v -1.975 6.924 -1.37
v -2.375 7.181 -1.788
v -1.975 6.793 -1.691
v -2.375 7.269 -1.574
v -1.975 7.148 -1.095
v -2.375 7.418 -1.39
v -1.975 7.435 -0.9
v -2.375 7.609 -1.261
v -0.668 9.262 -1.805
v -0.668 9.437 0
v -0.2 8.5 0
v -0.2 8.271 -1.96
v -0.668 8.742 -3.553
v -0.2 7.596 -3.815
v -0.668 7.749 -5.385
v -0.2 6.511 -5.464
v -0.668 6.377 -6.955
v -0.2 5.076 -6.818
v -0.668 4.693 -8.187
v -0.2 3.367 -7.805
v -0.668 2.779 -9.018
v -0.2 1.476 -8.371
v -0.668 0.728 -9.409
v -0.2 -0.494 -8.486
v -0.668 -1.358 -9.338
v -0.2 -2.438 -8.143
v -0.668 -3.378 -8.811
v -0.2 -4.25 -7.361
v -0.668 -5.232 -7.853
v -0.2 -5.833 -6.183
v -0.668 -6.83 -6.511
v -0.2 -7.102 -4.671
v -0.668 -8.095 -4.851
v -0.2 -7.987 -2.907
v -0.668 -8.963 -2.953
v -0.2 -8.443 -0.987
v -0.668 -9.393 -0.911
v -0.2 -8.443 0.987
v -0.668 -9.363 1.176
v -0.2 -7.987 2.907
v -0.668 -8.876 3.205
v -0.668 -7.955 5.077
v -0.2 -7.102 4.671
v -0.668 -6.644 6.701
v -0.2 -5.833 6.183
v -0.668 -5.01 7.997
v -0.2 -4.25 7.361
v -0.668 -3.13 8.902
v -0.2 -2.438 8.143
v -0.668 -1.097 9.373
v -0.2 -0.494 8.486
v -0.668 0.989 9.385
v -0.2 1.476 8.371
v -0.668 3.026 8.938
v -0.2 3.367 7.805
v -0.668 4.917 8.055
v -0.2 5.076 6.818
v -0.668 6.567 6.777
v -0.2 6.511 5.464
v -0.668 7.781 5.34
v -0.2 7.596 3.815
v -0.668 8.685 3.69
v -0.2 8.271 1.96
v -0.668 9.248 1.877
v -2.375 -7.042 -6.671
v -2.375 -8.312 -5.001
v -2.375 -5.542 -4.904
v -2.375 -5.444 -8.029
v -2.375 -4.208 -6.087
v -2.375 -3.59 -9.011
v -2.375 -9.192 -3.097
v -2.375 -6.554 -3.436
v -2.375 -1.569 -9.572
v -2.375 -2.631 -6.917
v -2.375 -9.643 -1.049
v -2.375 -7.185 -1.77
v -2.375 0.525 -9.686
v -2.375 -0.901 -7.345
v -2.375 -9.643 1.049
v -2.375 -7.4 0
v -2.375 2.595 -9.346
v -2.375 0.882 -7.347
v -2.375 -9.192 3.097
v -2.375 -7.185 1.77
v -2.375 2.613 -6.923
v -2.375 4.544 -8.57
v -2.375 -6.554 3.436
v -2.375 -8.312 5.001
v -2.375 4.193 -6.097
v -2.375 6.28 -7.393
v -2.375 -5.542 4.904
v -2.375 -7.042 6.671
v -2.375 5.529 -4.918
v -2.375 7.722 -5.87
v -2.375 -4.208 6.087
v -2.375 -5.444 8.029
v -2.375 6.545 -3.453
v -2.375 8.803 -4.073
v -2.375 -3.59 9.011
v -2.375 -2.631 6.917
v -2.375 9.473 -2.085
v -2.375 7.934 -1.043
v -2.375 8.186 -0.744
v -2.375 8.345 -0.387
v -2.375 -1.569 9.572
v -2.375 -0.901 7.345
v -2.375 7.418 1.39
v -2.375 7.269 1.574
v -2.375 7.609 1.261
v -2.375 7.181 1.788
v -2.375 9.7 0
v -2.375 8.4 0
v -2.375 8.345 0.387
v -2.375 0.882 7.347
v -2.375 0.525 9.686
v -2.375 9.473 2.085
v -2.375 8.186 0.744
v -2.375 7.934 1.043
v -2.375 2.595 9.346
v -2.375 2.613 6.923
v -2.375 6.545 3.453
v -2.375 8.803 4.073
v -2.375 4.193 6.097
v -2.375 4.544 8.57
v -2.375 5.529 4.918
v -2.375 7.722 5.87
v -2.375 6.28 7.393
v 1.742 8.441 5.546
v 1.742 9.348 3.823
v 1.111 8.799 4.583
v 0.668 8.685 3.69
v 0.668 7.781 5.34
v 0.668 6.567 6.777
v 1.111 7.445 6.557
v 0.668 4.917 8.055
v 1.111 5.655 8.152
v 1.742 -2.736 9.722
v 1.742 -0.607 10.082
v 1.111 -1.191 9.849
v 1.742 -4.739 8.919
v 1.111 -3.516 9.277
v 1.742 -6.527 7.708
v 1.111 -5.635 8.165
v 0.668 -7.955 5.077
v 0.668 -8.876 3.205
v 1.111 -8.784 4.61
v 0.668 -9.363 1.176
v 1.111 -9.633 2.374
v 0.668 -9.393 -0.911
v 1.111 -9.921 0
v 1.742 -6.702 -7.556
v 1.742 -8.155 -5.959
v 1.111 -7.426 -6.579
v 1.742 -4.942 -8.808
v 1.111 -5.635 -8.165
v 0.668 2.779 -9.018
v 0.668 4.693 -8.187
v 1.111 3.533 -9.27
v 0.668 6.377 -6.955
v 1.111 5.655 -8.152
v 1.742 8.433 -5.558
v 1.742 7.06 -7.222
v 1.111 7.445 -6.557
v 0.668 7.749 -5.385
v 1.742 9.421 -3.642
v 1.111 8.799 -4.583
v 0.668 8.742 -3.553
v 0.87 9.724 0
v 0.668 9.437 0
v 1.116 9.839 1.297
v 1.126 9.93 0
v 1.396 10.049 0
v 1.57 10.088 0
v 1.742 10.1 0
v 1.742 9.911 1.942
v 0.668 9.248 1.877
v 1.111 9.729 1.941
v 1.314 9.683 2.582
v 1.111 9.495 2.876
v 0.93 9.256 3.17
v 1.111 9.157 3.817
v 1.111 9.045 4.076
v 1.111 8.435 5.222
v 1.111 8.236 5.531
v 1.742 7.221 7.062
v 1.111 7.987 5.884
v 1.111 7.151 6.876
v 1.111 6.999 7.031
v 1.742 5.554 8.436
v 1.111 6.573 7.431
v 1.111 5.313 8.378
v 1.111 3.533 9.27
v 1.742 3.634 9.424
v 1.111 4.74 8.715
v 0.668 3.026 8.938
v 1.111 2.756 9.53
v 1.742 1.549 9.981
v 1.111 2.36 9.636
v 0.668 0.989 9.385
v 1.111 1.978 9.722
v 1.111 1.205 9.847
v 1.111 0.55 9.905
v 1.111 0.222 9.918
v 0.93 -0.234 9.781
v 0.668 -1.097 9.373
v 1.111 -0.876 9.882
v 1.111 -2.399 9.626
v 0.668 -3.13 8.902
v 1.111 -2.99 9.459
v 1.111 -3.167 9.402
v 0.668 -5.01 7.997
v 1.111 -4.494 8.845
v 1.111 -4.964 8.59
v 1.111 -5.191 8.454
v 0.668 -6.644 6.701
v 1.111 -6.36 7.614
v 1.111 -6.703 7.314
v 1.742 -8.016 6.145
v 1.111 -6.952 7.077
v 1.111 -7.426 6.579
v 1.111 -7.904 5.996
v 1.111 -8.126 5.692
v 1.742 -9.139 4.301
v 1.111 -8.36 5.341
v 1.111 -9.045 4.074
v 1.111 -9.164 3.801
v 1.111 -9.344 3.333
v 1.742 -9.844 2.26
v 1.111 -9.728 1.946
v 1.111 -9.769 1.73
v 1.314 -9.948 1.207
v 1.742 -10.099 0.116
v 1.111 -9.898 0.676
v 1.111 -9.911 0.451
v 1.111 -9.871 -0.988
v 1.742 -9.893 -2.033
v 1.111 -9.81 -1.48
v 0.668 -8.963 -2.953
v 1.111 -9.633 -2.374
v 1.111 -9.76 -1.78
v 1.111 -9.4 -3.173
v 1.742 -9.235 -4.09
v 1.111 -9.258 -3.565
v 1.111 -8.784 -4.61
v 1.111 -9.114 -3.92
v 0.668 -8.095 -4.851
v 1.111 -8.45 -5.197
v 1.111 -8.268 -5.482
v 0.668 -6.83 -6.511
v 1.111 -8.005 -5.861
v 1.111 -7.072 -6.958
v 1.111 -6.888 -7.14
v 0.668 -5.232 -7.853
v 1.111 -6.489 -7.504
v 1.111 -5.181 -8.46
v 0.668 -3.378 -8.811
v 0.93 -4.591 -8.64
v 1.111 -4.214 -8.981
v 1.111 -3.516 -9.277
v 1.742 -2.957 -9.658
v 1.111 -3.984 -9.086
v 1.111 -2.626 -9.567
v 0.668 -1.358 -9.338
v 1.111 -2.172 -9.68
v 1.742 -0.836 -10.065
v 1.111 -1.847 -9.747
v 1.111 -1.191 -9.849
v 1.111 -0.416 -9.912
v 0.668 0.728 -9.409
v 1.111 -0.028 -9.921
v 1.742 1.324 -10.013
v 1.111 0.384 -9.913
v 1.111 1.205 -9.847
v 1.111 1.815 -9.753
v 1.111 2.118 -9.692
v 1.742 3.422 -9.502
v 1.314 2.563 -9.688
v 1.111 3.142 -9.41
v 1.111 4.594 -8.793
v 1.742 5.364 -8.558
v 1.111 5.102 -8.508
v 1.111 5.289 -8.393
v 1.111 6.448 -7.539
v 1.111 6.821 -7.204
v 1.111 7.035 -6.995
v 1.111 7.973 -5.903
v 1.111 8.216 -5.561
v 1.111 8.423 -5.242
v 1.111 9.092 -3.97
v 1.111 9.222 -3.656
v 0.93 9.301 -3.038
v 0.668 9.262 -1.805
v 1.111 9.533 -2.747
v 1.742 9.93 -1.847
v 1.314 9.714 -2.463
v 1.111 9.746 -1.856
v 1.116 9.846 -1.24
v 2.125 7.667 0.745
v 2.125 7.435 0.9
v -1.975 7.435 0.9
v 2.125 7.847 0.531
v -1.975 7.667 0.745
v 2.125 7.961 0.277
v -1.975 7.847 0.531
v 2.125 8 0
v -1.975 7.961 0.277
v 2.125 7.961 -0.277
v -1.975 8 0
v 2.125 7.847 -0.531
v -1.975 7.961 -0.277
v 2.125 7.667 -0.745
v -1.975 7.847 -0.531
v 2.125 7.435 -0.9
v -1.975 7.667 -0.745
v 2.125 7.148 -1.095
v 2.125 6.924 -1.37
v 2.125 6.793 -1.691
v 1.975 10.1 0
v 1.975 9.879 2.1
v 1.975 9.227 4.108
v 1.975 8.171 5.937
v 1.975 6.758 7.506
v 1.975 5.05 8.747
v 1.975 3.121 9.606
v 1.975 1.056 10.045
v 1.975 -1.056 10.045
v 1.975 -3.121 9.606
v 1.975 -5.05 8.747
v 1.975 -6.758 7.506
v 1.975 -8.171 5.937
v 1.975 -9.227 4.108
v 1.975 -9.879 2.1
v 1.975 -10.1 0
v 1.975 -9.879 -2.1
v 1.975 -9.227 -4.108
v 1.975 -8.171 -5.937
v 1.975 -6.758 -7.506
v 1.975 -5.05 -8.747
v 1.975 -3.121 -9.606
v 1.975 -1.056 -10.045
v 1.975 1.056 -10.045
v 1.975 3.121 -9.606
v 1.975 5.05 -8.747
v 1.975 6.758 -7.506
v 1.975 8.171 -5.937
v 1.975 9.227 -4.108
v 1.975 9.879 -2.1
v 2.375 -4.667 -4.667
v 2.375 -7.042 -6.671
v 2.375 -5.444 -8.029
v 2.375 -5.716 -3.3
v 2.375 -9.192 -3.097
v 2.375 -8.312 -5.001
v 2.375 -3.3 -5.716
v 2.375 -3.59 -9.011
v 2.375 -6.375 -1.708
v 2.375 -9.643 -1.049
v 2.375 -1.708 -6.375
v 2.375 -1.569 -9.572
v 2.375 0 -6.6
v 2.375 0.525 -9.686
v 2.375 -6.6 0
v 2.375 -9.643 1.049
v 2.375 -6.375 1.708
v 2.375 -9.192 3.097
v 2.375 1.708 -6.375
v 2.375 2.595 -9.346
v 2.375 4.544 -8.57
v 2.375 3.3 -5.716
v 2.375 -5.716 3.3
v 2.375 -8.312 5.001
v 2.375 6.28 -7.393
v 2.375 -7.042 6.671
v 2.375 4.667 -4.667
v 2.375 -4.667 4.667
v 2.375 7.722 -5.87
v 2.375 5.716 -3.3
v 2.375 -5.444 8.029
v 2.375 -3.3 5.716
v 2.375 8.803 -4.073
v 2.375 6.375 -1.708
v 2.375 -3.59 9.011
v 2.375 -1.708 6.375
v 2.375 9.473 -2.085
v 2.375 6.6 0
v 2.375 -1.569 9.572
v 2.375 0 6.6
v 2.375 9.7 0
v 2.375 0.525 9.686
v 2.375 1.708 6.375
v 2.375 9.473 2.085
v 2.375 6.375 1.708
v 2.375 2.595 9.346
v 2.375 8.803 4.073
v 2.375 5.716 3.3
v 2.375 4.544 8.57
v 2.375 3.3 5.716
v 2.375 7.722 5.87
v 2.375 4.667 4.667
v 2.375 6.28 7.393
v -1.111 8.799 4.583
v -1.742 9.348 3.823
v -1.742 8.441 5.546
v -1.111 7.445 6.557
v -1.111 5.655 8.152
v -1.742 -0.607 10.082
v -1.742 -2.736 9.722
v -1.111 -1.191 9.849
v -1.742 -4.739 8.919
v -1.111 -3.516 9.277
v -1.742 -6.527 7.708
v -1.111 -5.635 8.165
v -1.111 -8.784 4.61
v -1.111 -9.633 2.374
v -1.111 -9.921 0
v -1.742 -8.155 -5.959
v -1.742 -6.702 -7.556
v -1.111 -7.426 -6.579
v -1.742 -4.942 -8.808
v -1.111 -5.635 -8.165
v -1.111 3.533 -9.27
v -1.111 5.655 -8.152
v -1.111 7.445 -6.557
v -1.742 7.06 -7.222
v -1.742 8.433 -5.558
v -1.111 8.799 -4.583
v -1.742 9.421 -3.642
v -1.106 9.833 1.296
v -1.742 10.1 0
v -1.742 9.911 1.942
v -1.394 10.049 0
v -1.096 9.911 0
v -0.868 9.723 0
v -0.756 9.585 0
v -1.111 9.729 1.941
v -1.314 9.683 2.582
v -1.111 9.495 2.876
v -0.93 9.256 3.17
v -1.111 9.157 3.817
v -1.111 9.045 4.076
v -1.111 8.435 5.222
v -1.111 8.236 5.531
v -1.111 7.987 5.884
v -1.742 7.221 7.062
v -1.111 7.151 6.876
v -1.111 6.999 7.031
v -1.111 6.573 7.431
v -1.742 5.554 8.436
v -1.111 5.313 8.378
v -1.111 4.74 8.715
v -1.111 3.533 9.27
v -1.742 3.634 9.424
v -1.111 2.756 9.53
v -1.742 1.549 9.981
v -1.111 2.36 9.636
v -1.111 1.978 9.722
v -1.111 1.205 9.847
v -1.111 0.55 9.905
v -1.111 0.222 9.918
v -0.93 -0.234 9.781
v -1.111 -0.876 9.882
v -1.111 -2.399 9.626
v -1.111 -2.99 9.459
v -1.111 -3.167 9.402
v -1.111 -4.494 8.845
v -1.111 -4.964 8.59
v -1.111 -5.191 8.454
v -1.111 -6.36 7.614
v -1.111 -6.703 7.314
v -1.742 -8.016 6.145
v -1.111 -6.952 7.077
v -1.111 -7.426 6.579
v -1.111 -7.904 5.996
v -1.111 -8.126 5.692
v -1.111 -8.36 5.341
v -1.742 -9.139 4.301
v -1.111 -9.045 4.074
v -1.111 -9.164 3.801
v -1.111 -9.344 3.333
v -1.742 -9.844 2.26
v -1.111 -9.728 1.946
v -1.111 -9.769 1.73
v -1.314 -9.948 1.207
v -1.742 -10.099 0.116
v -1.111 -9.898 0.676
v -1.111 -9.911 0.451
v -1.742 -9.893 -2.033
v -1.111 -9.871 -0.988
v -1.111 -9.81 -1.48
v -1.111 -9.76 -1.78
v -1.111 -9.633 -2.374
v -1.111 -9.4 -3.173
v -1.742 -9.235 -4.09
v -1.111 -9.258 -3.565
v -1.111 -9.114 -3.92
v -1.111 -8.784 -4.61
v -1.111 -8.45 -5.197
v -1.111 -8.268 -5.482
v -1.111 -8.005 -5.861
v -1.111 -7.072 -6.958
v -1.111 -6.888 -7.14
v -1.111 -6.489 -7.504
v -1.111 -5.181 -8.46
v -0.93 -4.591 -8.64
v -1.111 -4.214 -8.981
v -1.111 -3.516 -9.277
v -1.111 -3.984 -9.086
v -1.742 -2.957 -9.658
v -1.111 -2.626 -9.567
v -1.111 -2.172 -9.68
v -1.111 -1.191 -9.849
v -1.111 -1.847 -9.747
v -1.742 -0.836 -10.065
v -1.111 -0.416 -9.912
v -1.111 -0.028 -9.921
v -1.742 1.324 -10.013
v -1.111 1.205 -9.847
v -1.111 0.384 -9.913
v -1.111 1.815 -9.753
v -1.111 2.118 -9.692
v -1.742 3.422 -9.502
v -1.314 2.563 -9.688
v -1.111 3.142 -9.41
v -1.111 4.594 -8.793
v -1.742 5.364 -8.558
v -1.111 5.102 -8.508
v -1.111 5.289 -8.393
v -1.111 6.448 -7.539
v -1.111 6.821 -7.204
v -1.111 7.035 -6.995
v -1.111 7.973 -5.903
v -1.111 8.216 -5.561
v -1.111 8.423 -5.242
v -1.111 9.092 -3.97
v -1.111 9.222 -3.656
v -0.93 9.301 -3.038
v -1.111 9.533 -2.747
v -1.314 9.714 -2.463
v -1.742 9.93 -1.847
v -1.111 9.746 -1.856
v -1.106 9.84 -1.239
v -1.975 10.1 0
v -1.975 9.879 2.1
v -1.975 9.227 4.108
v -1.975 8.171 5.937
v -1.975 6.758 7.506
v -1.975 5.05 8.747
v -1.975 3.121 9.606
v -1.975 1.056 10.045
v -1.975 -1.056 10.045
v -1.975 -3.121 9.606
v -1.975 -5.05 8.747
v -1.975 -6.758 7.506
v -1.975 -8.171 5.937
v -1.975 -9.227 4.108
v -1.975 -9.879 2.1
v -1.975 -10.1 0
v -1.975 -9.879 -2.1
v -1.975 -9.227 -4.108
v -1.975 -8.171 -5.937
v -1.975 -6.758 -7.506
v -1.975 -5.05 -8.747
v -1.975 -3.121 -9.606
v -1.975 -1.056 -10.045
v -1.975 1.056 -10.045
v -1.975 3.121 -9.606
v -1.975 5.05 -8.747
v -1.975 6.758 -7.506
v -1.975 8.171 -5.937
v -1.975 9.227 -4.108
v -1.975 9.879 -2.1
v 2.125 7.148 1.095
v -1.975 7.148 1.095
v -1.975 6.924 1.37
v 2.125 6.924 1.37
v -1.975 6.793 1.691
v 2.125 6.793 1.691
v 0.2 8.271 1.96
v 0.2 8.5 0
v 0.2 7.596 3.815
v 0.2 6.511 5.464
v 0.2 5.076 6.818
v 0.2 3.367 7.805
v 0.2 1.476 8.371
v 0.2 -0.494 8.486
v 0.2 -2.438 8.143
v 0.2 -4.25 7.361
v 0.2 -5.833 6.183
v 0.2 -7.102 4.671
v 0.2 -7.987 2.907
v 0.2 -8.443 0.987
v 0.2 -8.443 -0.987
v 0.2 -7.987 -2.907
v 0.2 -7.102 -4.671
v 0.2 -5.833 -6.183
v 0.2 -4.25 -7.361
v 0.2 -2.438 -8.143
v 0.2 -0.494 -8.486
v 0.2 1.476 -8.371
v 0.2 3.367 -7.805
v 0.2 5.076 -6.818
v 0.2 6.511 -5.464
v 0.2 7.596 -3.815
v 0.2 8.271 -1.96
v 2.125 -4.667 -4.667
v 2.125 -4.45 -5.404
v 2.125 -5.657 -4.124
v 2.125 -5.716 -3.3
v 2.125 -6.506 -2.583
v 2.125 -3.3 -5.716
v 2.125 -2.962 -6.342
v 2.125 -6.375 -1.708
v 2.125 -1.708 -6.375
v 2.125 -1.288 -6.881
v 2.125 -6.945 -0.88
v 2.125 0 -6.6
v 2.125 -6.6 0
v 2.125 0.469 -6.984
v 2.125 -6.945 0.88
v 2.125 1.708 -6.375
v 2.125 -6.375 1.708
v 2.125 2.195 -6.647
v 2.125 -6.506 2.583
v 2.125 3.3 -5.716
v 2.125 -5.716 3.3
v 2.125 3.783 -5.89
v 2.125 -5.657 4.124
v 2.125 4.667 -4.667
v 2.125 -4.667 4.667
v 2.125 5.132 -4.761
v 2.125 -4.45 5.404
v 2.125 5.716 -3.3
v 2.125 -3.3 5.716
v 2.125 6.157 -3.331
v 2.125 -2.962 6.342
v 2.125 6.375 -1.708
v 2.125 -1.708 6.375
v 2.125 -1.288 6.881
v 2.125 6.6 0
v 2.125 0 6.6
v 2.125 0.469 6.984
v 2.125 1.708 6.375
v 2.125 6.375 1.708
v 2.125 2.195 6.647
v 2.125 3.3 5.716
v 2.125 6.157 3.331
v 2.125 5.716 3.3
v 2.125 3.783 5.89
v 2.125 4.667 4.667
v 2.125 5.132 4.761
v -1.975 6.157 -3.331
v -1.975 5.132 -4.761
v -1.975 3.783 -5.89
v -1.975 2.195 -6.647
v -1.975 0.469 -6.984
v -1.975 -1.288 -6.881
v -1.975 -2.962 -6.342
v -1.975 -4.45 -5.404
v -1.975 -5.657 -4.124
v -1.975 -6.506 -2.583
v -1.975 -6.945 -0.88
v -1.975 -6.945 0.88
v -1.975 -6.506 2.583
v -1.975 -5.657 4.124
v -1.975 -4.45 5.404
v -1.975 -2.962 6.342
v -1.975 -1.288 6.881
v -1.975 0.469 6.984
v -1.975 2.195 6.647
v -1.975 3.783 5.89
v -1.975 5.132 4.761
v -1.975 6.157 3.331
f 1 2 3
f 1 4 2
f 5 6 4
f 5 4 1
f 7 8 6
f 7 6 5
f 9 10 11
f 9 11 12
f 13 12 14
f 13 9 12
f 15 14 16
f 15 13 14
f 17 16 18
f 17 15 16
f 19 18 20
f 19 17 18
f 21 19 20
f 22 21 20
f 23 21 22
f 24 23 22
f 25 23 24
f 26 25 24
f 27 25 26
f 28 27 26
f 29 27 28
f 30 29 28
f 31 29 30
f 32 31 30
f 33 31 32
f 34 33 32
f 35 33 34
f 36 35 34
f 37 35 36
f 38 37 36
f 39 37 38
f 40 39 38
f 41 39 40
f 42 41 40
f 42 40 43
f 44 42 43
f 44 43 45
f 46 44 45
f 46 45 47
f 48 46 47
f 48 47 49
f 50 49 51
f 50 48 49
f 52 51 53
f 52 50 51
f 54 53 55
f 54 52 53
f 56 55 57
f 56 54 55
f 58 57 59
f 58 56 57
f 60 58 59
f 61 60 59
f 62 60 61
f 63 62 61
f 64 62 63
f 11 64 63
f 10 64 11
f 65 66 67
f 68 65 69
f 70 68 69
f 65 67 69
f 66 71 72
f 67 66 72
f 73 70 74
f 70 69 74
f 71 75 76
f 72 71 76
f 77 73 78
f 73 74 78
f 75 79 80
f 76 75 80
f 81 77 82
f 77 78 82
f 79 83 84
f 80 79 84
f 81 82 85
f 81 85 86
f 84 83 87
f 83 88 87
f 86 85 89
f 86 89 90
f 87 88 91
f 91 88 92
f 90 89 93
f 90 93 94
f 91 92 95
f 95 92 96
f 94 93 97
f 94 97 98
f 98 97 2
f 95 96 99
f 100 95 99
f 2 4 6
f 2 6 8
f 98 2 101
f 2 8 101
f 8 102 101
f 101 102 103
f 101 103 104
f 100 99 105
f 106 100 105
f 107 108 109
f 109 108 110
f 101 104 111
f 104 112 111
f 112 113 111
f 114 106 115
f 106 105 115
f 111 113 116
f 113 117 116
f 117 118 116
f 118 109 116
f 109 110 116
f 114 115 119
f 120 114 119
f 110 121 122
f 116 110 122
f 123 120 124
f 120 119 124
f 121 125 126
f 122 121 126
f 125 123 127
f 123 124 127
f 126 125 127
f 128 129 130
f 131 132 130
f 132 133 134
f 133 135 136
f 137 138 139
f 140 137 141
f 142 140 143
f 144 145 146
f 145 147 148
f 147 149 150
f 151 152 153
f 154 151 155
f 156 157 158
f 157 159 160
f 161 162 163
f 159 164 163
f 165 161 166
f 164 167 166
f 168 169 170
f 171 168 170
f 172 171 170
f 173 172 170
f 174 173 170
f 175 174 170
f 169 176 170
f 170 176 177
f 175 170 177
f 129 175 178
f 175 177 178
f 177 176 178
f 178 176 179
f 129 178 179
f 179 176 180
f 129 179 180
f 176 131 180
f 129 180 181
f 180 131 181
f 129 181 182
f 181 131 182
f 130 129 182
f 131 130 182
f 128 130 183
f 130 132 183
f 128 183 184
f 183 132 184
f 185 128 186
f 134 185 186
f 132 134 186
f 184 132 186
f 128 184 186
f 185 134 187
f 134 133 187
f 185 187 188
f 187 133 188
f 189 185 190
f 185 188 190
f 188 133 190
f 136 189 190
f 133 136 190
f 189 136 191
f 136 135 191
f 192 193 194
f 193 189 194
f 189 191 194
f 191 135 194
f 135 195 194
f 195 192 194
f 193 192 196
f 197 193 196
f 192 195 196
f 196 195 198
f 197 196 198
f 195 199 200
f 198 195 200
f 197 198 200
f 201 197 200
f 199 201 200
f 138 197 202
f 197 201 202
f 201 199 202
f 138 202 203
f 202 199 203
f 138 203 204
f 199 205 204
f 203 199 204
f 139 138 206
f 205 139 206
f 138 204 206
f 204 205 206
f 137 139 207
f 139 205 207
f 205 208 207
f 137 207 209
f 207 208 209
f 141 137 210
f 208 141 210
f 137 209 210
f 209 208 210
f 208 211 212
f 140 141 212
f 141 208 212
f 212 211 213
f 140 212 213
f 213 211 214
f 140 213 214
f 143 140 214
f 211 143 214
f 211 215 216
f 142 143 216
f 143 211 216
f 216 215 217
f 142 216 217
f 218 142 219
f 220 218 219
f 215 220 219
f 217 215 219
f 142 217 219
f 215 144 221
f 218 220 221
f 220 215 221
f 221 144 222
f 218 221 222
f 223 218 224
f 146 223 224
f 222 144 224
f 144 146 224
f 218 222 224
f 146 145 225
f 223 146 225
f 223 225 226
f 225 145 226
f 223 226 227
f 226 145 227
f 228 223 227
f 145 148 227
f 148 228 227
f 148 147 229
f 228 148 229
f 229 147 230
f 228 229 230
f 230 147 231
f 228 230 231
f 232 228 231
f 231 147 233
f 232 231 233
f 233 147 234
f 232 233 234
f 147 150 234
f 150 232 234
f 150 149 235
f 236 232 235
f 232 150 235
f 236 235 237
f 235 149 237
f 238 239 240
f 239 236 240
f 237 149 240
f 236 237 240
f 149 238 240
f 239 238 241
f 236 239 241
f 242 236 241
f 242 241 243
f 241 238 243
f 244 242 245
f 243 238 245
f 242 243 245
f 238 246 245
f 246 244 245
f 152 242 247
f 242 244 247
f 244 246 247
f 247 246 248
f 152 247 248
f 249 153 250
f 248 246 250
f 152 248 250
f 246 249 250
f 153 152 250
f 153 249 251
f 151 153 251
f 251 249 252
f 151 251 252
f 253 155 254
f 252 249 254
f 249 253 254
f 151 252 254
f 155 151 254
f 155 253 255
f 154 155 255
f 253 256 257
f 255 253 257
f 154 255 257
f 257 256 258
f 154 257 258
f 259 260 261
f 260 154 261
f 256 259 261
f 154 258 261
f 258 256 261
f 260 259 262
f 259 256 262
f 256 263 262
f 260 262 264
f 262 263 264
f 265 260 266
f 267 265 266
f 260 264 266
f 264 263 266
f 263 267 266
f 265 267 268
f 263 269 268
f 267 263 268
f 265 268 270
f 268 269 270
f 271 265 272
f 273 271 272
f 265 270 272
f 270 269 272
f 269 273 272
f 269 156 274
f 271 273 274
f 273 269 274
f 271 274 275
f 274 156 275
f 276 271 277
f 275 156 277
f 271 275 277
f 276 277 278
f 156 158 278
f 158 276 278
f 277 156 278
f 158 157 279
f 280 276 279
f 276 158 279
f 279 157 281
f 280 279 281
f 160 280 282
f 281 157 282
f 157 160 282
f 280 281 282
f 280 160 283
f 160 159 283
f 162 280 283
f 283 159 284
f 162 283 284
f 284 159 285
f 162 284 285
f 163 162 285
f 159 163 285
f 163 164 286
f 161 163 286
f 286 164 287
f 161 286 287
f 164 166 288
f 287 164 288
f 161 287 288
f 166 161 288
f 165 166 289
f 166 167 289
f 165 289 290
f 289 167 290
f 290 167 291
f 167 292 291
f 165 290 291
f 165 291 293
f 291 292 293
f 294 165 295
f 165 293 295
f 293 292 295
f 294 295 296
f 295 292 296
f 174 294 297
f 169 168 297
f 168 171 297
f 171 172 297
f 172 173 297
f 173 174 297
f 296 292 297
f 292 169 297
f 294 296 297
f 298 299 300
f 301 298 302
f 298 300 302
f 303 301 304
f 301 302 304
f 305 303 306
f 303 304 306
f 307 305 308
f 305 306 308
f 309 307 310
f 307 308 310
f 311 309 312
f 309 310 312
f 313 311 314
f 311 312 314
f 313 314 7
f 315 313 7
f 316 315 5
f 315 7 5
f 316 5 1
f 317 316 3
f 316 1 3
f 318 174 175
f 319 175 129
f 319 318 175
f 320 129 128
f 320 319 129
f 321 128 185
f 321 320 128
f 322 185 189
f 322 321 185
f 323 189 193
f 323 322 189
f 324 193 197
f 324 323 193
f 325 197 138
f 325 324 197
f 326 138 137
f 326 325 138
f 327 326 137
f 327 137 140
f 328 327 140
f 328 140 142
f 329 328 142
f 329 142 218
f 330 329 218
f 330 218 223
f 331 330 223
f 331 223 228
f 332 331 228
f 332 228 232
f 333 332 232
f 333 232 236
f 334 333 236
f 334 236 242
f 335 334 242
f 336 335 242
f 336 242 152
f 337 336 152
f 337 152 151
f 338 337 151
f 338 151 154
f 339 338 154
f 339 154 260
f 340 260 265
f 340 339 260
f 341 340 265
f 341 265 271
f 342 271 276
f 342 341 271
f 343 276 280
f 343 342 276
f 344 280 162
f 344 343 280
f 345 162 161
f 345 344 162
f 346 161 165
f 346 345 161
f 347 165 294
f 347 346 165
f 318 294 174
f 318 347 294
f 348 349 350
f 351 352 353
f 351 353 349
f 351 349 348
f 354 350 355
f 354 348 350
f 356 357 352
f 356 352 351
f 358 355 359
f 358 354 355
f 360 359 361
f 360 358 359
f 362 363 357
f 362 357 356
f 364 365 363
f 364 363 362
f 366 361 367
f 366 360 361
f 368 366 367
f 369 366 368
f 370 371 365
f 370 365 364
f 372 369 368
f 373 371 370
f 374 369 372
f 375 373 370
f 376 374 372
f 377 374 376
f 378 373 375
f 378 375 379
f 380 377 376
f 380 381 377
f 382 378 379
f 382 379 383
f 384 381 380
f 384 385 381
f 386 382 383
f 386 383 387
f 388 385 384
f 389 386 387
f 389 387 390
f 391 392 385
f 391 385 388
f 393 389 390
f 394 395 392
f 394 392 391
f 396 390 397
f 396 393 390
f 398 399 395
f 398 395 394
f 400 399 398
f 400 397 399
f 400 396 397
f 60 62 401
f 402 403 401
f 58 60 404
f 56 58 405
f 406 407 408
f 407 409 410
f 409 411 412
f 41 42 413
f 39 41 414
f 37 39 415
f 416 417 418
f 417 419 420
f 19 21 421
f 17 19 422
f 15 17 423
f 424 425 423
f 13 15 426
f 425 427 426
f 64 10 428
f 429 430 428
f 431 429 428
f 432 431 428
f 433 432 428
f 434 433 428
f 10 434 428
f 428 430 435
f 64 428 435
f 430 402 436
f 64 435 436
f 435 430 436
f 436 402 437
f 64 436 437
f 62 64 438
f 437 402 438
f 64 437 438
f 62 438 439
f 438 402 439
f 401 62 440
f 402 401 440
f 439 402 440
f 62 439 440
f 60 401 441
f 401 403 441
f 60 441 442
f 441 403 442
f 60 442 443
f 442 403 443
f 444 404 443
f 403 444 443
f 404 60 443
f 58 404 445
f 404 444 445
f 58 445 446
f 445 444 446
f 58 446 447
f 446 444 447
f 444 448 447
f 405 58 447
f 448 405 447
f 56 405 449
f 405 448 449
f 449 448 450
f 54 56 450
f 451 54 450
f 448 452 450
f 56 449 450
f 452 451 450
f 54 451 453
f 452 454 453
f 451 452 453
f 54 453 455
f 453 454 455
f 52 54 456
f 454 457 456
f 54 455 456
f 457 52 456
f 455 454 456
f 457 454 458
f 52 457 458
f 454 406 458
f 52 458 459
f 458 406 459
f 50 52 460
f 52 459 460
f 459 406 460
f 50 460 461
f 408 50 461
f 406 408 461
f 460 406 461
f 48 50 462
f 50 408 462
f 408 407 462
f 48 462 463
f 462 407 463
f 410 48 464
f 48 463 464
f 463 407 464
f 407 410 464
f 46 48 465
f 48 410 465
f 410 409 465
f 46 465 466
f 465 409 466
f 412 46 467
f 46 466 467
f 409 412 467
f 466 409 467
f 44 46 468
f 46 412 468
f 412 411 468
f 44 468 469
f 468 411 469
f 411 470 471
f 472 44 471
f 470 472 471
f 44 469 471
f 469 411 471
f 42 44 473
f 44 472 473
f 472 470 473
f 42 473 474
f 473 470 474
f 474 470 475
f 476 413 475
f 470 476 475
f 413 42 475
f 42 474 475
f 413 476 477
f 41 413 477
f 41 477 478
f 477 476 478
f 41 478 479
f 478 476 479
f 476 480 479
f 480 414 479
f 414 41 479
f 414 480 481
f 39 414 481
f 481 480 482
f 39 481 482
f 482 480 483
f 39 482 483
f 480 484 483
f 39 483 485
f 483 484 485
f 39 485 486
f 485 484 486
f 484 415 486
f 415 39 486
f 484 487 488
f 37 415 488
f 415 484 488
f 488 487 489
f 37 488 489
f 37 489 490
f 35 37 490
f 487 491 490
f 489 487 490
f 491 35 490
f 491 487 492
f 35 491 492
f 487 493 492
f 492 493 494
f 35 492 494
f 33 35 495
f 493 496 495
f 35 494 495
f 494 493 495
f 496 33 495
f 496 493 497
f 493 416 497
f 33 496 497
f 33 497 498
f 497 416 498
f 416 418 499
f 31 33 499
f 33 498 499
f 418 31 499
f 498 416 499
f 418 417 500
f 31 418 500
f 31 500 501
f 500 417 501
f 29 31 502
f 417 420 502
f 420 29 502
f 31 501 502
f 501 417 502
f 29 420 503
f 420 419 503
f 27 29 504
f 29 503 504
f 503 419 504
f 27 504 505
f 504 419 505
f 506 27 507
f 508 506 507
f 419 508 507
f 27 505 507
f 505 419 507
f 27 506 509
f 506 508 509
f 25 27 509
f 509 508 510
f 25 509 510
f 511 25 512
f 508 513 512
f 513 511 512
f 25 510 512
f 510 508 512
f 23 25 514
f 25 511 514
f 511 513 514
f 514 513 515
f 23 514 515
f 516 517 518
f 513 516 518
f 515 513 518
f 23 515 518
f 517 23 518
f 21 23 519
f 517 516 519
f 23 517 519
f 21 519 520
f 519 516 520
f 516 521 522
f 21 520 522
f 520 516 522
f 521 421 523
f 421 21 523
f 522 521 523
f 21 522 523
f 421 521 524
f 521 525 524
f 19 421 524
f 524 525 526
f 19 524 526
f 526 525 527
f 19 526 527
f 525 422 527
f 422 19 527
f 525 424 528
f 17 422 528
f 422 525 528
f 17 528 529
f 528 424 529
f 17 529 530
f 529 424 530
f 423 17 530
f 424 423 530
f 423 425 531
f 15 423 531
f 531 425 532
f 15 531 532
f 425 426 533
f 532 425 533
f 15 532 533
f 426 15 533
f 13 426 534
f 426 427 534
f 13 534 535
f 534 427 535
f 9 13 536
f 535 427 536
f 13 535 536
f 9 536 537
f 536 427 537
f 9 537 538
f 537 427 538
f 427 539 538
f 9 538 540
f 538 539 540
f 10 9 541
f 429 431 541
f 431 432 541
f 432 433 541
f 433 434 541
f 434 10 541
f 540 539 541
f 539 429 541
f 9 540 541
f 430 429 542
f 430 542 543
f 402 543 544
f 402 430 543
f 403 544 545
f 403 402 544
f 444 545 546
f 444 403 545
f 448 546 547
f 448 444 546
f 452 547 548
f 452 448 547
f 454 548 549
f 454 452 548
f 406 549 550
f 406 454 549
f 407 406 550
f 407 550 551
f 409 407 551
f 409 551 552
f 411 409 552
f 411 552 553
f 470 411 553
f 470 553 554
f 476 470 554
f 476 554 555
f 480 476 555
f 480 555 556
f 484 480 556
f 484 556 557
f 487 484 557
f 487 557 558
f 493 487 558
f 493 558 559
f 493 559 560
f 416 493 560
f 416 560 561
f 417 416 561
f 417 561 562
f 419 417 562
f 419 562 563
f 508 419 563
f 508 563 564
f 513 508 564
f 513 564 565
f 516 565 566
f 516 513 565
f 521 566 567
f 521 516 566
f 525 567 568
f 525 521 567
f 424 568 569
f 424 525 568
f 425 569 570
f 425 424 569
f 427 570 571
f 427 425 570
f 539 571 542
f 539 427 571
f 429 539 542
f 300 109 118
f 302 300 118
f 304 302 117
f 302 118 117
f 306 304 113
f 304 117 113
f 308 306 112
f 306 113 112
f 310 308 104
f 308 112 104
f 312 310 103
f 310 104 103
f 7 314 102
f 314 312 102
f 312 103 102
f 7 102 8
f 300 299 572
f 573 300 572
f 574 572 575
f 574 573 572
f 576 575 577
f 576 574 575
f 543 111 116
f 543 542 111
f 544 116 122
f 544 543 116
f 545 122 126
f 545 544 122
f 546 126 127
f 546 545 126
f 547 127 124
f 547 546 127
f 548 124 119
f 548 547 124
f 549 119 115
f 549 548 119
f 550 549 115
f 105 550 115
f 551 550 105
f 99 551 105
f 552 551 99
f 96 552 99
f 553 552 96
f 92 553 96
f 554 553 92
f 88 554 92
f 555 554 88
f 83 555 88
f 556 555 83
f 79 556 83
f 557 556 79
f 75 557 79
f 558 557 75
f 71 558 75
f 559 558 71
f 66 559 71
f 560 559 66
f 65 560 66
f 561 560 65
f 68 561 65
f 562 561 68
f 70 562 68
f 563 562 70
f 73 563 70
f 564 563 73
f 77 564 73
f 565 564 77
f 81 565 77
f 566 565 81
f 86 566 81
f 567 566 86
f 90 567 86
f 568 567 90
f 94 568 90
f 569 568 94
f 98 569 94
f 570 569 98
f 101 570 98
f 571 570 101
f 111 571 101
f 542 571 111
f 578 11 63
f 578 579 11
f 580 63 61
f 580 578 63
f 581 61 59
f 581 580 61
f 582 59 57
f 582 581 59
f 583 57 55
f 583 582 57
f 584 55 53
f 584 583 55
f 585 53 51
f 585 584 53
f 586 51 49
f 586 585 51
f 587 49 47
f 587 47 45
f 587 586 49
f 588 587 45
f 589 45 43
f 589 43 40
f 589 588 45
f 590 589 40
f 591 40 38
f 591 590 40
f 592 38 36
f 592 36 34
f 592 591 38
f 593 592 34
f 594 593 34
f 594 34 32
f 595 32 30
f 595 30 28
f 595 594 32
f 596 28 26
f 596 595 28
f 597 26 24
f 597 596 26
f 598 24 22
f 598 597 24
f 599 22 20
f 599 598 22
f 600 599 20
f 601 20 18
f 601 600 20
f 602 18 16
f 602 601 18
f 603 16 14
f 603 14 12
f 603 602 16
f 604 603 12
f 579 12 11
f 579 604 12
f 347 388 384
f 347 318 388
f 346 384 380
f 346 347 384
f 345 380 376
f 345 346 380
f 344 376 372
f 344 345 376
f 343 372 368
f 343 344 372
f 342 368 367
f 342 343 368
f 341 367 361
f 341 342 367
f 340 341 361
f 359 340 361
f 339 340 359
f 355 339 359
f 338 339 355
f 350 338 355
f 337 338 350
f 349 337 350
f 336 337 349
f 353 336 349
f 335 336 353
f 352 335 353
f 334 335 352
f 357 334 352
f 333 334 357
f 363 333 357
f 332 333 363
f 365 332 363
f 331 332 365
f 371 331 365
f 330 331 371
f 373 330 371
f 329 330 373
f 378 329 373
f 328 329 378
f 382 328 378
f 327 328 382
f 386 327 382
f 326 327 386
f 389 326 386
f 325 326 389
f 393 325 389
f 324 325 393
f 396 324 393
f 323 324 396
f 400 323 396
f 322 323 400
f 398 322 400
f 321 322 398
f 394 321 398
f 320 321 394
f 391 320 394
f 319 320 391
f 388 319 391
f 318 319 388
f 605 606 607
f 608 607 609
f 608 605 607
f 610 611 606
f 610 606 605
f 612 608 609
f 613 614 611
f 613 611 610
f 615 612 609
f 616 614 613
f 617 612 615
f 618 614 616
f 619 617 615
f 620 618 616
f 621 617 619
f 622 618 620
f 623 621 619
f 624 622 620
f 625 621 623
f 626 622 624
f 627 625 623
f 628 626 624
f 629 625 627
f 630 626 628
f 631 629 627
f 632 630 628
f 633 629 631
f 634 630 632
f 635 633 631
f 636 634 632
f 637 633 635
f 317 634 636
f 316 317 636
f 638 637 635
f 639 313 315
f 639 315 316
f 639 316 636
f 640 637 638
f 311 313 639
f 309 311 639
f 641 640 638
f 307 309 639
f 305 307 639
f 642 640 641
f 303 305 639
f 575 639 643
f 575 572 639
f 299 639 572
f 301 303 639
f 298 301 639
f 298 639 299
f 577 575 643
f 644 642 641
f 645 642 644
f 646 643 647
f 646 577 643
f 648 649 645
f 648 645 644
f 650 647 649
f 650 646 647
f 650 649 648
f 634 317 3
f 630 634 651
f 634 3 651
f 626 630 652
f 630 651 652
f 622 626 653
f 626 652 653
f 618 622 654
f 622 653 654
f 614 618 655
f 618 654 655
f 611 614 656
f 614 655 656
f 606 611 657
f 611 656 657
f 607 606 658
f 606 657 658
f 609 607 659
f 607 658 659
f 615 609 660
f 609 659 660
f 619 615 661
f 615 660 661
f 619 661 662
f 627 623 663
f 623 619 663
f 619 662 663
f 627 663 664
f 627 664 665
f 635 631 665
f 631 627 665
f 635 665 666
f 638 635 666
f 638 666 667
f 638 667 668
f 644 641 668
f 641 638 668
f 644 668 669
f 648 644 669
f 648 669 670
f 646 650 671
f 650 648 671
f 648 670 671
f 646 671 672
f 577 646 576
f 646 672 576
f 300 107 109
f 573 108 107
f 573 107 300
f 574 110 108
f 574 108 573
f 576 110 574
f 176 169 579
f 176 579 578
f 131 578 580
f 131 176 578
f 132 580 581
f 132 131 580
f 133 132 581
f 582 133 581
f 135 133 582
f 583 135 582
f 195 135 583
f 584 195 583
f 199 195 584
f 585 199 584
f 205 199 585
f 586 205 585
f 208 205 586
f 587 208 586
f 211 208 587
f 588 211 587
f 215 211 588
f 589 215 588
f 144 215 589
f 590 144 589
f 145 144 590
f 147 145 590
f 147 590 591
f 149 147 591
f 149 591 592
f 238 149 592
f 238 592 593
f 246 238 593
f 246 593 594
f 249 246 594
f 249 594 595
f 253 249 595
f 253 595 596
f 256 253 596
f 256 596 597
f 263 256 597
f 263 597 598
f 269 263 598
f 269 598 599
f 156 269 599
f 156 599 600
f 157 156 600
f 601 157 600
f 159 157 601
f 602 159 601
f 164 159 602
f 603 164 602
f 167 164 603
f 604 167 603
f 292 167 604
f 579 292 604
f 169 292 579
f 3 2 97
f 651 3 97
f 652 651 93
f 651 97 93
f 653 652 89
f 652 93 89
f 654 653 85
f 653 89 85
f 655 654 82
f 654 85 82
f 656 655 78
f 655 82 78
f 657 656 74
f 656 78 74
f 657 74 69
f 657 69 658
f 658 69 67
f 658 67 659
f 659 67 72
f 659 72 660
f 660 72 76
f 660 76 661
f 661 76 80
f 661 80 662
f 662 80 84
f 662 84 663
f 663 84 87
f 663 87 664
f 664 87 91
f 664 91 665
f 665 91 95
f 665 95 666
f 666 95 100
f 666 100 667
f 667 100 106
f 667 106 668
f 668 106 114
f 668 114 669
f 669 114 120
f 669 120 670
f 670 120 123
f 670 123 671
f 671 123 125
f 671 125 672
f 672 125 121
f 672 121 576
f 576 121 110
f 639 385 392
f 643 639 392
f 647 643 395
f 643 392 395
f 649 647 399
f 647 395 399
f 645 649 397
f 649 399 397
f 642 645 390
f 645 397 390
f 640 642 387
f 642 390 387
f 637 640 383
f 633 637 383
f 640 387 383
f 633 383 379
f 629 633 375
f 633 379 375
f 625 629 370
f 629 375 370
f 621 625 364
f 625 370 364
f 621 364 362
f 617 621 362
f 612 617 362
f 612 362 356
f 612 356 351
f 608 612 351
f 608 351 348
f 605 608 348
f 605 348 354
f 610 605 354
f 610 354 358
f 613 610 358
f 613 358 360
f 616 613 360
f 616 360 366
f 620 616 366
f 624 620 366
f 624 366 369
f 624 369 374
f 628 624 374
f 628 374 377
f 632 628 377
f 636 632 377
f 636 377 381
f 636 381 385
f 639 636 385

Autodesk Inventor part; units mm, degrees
ref_plane "YZ Plane" through (0, 0, 0) normal (1, 0, 0) x (0, 1, 0)
ref_plane "XZ Plane" through (0, 0, 0) normal (0, 1, 0) x (-1, 0, 0)
ref_plane "XY Plane" through (0, 0, 0) normal (0, 0, 1) x (1, 0, 0)
sketch "Эскиз1" plane through (0, 0, 0) normal (0, 0, 1) x (1, 0, 0)
  line L0 (-2.375, 10.1) -> (-1, 10.1)
  line L1 (2.375, 10.1) -> (2.375, 6.6)
  line L2 (2.125, 7) -> (-2.375, 7)
  line L3 (-2.375, 7) -> (-2.375, 10.1)
  line L4 (-3.325, 0) -> (3.325, 0) construction
  line L5 (0, -2.02) -> (0, 12.12) construction
  line L6 (1, 10.1) -> (2.375, 10.1)
  line L7 (-1, 10.1) -> (-0.2, 8.5)
  line L8 (-0.2, 8.5) -> (0.2, 8.5)
  line L9 (0.2, 8.5) -> (1, 10.1)
  line L10 (2.125, 7) -> (2.125, 6.6)
  line L11 (2.125, 6.6) -> (2.375, 6.6)
  point P0 (0, 0)
  point P1 (0, 8.5)
  dimension "d0" = 7
  dimension "d5" = 0.4
  dimension "d6" = 1.5
  dimension "d7" = 2
  dimension "d12" = 0.25
  dimension "d13" = 3.5
  dimension "d14" = 0.4
  dimension "d16" = 4.5
revolve "Вращение1" add sketch "Эскиз1" angle 360 about axis through (-10, 0, 0) along (1, 0, 0)
sketch "Эскиз2" plane through (-2.375, 0, 0) normal (-1, 0, 0) x (0, 0, 1)
  circle A0 centre (0, 0) radius 7 construction
  circle A1 centre (0, 7) radius 1
  line L0 (0, -14.14) -> (0, 14.14) construction
  dimension "d21" = 2
extrude "Выдавливание1" cut sketch "Эскиз2" against normal up to surface (4.5 mm away)
fillet "Сопряжение1" radius 1.2 4 edges at (-1, -10.1, 0) (1, -10.1, 0) (-0.125, 6.9286, -0.9974) (-0.125, 6.9286, 0.9974)
chamfer "Фаска2" distance 0.4 angle 45 6 edges at (2.375, -10.1, 0) (-2.375, -10.1, 0) (-2.375, -7, 0) (-2.375, 7.0258, 1.2241) (-2.375, 7.0258, -1.2241) (-2.375, 8, 0)
properties part number "Шкив рычага"
